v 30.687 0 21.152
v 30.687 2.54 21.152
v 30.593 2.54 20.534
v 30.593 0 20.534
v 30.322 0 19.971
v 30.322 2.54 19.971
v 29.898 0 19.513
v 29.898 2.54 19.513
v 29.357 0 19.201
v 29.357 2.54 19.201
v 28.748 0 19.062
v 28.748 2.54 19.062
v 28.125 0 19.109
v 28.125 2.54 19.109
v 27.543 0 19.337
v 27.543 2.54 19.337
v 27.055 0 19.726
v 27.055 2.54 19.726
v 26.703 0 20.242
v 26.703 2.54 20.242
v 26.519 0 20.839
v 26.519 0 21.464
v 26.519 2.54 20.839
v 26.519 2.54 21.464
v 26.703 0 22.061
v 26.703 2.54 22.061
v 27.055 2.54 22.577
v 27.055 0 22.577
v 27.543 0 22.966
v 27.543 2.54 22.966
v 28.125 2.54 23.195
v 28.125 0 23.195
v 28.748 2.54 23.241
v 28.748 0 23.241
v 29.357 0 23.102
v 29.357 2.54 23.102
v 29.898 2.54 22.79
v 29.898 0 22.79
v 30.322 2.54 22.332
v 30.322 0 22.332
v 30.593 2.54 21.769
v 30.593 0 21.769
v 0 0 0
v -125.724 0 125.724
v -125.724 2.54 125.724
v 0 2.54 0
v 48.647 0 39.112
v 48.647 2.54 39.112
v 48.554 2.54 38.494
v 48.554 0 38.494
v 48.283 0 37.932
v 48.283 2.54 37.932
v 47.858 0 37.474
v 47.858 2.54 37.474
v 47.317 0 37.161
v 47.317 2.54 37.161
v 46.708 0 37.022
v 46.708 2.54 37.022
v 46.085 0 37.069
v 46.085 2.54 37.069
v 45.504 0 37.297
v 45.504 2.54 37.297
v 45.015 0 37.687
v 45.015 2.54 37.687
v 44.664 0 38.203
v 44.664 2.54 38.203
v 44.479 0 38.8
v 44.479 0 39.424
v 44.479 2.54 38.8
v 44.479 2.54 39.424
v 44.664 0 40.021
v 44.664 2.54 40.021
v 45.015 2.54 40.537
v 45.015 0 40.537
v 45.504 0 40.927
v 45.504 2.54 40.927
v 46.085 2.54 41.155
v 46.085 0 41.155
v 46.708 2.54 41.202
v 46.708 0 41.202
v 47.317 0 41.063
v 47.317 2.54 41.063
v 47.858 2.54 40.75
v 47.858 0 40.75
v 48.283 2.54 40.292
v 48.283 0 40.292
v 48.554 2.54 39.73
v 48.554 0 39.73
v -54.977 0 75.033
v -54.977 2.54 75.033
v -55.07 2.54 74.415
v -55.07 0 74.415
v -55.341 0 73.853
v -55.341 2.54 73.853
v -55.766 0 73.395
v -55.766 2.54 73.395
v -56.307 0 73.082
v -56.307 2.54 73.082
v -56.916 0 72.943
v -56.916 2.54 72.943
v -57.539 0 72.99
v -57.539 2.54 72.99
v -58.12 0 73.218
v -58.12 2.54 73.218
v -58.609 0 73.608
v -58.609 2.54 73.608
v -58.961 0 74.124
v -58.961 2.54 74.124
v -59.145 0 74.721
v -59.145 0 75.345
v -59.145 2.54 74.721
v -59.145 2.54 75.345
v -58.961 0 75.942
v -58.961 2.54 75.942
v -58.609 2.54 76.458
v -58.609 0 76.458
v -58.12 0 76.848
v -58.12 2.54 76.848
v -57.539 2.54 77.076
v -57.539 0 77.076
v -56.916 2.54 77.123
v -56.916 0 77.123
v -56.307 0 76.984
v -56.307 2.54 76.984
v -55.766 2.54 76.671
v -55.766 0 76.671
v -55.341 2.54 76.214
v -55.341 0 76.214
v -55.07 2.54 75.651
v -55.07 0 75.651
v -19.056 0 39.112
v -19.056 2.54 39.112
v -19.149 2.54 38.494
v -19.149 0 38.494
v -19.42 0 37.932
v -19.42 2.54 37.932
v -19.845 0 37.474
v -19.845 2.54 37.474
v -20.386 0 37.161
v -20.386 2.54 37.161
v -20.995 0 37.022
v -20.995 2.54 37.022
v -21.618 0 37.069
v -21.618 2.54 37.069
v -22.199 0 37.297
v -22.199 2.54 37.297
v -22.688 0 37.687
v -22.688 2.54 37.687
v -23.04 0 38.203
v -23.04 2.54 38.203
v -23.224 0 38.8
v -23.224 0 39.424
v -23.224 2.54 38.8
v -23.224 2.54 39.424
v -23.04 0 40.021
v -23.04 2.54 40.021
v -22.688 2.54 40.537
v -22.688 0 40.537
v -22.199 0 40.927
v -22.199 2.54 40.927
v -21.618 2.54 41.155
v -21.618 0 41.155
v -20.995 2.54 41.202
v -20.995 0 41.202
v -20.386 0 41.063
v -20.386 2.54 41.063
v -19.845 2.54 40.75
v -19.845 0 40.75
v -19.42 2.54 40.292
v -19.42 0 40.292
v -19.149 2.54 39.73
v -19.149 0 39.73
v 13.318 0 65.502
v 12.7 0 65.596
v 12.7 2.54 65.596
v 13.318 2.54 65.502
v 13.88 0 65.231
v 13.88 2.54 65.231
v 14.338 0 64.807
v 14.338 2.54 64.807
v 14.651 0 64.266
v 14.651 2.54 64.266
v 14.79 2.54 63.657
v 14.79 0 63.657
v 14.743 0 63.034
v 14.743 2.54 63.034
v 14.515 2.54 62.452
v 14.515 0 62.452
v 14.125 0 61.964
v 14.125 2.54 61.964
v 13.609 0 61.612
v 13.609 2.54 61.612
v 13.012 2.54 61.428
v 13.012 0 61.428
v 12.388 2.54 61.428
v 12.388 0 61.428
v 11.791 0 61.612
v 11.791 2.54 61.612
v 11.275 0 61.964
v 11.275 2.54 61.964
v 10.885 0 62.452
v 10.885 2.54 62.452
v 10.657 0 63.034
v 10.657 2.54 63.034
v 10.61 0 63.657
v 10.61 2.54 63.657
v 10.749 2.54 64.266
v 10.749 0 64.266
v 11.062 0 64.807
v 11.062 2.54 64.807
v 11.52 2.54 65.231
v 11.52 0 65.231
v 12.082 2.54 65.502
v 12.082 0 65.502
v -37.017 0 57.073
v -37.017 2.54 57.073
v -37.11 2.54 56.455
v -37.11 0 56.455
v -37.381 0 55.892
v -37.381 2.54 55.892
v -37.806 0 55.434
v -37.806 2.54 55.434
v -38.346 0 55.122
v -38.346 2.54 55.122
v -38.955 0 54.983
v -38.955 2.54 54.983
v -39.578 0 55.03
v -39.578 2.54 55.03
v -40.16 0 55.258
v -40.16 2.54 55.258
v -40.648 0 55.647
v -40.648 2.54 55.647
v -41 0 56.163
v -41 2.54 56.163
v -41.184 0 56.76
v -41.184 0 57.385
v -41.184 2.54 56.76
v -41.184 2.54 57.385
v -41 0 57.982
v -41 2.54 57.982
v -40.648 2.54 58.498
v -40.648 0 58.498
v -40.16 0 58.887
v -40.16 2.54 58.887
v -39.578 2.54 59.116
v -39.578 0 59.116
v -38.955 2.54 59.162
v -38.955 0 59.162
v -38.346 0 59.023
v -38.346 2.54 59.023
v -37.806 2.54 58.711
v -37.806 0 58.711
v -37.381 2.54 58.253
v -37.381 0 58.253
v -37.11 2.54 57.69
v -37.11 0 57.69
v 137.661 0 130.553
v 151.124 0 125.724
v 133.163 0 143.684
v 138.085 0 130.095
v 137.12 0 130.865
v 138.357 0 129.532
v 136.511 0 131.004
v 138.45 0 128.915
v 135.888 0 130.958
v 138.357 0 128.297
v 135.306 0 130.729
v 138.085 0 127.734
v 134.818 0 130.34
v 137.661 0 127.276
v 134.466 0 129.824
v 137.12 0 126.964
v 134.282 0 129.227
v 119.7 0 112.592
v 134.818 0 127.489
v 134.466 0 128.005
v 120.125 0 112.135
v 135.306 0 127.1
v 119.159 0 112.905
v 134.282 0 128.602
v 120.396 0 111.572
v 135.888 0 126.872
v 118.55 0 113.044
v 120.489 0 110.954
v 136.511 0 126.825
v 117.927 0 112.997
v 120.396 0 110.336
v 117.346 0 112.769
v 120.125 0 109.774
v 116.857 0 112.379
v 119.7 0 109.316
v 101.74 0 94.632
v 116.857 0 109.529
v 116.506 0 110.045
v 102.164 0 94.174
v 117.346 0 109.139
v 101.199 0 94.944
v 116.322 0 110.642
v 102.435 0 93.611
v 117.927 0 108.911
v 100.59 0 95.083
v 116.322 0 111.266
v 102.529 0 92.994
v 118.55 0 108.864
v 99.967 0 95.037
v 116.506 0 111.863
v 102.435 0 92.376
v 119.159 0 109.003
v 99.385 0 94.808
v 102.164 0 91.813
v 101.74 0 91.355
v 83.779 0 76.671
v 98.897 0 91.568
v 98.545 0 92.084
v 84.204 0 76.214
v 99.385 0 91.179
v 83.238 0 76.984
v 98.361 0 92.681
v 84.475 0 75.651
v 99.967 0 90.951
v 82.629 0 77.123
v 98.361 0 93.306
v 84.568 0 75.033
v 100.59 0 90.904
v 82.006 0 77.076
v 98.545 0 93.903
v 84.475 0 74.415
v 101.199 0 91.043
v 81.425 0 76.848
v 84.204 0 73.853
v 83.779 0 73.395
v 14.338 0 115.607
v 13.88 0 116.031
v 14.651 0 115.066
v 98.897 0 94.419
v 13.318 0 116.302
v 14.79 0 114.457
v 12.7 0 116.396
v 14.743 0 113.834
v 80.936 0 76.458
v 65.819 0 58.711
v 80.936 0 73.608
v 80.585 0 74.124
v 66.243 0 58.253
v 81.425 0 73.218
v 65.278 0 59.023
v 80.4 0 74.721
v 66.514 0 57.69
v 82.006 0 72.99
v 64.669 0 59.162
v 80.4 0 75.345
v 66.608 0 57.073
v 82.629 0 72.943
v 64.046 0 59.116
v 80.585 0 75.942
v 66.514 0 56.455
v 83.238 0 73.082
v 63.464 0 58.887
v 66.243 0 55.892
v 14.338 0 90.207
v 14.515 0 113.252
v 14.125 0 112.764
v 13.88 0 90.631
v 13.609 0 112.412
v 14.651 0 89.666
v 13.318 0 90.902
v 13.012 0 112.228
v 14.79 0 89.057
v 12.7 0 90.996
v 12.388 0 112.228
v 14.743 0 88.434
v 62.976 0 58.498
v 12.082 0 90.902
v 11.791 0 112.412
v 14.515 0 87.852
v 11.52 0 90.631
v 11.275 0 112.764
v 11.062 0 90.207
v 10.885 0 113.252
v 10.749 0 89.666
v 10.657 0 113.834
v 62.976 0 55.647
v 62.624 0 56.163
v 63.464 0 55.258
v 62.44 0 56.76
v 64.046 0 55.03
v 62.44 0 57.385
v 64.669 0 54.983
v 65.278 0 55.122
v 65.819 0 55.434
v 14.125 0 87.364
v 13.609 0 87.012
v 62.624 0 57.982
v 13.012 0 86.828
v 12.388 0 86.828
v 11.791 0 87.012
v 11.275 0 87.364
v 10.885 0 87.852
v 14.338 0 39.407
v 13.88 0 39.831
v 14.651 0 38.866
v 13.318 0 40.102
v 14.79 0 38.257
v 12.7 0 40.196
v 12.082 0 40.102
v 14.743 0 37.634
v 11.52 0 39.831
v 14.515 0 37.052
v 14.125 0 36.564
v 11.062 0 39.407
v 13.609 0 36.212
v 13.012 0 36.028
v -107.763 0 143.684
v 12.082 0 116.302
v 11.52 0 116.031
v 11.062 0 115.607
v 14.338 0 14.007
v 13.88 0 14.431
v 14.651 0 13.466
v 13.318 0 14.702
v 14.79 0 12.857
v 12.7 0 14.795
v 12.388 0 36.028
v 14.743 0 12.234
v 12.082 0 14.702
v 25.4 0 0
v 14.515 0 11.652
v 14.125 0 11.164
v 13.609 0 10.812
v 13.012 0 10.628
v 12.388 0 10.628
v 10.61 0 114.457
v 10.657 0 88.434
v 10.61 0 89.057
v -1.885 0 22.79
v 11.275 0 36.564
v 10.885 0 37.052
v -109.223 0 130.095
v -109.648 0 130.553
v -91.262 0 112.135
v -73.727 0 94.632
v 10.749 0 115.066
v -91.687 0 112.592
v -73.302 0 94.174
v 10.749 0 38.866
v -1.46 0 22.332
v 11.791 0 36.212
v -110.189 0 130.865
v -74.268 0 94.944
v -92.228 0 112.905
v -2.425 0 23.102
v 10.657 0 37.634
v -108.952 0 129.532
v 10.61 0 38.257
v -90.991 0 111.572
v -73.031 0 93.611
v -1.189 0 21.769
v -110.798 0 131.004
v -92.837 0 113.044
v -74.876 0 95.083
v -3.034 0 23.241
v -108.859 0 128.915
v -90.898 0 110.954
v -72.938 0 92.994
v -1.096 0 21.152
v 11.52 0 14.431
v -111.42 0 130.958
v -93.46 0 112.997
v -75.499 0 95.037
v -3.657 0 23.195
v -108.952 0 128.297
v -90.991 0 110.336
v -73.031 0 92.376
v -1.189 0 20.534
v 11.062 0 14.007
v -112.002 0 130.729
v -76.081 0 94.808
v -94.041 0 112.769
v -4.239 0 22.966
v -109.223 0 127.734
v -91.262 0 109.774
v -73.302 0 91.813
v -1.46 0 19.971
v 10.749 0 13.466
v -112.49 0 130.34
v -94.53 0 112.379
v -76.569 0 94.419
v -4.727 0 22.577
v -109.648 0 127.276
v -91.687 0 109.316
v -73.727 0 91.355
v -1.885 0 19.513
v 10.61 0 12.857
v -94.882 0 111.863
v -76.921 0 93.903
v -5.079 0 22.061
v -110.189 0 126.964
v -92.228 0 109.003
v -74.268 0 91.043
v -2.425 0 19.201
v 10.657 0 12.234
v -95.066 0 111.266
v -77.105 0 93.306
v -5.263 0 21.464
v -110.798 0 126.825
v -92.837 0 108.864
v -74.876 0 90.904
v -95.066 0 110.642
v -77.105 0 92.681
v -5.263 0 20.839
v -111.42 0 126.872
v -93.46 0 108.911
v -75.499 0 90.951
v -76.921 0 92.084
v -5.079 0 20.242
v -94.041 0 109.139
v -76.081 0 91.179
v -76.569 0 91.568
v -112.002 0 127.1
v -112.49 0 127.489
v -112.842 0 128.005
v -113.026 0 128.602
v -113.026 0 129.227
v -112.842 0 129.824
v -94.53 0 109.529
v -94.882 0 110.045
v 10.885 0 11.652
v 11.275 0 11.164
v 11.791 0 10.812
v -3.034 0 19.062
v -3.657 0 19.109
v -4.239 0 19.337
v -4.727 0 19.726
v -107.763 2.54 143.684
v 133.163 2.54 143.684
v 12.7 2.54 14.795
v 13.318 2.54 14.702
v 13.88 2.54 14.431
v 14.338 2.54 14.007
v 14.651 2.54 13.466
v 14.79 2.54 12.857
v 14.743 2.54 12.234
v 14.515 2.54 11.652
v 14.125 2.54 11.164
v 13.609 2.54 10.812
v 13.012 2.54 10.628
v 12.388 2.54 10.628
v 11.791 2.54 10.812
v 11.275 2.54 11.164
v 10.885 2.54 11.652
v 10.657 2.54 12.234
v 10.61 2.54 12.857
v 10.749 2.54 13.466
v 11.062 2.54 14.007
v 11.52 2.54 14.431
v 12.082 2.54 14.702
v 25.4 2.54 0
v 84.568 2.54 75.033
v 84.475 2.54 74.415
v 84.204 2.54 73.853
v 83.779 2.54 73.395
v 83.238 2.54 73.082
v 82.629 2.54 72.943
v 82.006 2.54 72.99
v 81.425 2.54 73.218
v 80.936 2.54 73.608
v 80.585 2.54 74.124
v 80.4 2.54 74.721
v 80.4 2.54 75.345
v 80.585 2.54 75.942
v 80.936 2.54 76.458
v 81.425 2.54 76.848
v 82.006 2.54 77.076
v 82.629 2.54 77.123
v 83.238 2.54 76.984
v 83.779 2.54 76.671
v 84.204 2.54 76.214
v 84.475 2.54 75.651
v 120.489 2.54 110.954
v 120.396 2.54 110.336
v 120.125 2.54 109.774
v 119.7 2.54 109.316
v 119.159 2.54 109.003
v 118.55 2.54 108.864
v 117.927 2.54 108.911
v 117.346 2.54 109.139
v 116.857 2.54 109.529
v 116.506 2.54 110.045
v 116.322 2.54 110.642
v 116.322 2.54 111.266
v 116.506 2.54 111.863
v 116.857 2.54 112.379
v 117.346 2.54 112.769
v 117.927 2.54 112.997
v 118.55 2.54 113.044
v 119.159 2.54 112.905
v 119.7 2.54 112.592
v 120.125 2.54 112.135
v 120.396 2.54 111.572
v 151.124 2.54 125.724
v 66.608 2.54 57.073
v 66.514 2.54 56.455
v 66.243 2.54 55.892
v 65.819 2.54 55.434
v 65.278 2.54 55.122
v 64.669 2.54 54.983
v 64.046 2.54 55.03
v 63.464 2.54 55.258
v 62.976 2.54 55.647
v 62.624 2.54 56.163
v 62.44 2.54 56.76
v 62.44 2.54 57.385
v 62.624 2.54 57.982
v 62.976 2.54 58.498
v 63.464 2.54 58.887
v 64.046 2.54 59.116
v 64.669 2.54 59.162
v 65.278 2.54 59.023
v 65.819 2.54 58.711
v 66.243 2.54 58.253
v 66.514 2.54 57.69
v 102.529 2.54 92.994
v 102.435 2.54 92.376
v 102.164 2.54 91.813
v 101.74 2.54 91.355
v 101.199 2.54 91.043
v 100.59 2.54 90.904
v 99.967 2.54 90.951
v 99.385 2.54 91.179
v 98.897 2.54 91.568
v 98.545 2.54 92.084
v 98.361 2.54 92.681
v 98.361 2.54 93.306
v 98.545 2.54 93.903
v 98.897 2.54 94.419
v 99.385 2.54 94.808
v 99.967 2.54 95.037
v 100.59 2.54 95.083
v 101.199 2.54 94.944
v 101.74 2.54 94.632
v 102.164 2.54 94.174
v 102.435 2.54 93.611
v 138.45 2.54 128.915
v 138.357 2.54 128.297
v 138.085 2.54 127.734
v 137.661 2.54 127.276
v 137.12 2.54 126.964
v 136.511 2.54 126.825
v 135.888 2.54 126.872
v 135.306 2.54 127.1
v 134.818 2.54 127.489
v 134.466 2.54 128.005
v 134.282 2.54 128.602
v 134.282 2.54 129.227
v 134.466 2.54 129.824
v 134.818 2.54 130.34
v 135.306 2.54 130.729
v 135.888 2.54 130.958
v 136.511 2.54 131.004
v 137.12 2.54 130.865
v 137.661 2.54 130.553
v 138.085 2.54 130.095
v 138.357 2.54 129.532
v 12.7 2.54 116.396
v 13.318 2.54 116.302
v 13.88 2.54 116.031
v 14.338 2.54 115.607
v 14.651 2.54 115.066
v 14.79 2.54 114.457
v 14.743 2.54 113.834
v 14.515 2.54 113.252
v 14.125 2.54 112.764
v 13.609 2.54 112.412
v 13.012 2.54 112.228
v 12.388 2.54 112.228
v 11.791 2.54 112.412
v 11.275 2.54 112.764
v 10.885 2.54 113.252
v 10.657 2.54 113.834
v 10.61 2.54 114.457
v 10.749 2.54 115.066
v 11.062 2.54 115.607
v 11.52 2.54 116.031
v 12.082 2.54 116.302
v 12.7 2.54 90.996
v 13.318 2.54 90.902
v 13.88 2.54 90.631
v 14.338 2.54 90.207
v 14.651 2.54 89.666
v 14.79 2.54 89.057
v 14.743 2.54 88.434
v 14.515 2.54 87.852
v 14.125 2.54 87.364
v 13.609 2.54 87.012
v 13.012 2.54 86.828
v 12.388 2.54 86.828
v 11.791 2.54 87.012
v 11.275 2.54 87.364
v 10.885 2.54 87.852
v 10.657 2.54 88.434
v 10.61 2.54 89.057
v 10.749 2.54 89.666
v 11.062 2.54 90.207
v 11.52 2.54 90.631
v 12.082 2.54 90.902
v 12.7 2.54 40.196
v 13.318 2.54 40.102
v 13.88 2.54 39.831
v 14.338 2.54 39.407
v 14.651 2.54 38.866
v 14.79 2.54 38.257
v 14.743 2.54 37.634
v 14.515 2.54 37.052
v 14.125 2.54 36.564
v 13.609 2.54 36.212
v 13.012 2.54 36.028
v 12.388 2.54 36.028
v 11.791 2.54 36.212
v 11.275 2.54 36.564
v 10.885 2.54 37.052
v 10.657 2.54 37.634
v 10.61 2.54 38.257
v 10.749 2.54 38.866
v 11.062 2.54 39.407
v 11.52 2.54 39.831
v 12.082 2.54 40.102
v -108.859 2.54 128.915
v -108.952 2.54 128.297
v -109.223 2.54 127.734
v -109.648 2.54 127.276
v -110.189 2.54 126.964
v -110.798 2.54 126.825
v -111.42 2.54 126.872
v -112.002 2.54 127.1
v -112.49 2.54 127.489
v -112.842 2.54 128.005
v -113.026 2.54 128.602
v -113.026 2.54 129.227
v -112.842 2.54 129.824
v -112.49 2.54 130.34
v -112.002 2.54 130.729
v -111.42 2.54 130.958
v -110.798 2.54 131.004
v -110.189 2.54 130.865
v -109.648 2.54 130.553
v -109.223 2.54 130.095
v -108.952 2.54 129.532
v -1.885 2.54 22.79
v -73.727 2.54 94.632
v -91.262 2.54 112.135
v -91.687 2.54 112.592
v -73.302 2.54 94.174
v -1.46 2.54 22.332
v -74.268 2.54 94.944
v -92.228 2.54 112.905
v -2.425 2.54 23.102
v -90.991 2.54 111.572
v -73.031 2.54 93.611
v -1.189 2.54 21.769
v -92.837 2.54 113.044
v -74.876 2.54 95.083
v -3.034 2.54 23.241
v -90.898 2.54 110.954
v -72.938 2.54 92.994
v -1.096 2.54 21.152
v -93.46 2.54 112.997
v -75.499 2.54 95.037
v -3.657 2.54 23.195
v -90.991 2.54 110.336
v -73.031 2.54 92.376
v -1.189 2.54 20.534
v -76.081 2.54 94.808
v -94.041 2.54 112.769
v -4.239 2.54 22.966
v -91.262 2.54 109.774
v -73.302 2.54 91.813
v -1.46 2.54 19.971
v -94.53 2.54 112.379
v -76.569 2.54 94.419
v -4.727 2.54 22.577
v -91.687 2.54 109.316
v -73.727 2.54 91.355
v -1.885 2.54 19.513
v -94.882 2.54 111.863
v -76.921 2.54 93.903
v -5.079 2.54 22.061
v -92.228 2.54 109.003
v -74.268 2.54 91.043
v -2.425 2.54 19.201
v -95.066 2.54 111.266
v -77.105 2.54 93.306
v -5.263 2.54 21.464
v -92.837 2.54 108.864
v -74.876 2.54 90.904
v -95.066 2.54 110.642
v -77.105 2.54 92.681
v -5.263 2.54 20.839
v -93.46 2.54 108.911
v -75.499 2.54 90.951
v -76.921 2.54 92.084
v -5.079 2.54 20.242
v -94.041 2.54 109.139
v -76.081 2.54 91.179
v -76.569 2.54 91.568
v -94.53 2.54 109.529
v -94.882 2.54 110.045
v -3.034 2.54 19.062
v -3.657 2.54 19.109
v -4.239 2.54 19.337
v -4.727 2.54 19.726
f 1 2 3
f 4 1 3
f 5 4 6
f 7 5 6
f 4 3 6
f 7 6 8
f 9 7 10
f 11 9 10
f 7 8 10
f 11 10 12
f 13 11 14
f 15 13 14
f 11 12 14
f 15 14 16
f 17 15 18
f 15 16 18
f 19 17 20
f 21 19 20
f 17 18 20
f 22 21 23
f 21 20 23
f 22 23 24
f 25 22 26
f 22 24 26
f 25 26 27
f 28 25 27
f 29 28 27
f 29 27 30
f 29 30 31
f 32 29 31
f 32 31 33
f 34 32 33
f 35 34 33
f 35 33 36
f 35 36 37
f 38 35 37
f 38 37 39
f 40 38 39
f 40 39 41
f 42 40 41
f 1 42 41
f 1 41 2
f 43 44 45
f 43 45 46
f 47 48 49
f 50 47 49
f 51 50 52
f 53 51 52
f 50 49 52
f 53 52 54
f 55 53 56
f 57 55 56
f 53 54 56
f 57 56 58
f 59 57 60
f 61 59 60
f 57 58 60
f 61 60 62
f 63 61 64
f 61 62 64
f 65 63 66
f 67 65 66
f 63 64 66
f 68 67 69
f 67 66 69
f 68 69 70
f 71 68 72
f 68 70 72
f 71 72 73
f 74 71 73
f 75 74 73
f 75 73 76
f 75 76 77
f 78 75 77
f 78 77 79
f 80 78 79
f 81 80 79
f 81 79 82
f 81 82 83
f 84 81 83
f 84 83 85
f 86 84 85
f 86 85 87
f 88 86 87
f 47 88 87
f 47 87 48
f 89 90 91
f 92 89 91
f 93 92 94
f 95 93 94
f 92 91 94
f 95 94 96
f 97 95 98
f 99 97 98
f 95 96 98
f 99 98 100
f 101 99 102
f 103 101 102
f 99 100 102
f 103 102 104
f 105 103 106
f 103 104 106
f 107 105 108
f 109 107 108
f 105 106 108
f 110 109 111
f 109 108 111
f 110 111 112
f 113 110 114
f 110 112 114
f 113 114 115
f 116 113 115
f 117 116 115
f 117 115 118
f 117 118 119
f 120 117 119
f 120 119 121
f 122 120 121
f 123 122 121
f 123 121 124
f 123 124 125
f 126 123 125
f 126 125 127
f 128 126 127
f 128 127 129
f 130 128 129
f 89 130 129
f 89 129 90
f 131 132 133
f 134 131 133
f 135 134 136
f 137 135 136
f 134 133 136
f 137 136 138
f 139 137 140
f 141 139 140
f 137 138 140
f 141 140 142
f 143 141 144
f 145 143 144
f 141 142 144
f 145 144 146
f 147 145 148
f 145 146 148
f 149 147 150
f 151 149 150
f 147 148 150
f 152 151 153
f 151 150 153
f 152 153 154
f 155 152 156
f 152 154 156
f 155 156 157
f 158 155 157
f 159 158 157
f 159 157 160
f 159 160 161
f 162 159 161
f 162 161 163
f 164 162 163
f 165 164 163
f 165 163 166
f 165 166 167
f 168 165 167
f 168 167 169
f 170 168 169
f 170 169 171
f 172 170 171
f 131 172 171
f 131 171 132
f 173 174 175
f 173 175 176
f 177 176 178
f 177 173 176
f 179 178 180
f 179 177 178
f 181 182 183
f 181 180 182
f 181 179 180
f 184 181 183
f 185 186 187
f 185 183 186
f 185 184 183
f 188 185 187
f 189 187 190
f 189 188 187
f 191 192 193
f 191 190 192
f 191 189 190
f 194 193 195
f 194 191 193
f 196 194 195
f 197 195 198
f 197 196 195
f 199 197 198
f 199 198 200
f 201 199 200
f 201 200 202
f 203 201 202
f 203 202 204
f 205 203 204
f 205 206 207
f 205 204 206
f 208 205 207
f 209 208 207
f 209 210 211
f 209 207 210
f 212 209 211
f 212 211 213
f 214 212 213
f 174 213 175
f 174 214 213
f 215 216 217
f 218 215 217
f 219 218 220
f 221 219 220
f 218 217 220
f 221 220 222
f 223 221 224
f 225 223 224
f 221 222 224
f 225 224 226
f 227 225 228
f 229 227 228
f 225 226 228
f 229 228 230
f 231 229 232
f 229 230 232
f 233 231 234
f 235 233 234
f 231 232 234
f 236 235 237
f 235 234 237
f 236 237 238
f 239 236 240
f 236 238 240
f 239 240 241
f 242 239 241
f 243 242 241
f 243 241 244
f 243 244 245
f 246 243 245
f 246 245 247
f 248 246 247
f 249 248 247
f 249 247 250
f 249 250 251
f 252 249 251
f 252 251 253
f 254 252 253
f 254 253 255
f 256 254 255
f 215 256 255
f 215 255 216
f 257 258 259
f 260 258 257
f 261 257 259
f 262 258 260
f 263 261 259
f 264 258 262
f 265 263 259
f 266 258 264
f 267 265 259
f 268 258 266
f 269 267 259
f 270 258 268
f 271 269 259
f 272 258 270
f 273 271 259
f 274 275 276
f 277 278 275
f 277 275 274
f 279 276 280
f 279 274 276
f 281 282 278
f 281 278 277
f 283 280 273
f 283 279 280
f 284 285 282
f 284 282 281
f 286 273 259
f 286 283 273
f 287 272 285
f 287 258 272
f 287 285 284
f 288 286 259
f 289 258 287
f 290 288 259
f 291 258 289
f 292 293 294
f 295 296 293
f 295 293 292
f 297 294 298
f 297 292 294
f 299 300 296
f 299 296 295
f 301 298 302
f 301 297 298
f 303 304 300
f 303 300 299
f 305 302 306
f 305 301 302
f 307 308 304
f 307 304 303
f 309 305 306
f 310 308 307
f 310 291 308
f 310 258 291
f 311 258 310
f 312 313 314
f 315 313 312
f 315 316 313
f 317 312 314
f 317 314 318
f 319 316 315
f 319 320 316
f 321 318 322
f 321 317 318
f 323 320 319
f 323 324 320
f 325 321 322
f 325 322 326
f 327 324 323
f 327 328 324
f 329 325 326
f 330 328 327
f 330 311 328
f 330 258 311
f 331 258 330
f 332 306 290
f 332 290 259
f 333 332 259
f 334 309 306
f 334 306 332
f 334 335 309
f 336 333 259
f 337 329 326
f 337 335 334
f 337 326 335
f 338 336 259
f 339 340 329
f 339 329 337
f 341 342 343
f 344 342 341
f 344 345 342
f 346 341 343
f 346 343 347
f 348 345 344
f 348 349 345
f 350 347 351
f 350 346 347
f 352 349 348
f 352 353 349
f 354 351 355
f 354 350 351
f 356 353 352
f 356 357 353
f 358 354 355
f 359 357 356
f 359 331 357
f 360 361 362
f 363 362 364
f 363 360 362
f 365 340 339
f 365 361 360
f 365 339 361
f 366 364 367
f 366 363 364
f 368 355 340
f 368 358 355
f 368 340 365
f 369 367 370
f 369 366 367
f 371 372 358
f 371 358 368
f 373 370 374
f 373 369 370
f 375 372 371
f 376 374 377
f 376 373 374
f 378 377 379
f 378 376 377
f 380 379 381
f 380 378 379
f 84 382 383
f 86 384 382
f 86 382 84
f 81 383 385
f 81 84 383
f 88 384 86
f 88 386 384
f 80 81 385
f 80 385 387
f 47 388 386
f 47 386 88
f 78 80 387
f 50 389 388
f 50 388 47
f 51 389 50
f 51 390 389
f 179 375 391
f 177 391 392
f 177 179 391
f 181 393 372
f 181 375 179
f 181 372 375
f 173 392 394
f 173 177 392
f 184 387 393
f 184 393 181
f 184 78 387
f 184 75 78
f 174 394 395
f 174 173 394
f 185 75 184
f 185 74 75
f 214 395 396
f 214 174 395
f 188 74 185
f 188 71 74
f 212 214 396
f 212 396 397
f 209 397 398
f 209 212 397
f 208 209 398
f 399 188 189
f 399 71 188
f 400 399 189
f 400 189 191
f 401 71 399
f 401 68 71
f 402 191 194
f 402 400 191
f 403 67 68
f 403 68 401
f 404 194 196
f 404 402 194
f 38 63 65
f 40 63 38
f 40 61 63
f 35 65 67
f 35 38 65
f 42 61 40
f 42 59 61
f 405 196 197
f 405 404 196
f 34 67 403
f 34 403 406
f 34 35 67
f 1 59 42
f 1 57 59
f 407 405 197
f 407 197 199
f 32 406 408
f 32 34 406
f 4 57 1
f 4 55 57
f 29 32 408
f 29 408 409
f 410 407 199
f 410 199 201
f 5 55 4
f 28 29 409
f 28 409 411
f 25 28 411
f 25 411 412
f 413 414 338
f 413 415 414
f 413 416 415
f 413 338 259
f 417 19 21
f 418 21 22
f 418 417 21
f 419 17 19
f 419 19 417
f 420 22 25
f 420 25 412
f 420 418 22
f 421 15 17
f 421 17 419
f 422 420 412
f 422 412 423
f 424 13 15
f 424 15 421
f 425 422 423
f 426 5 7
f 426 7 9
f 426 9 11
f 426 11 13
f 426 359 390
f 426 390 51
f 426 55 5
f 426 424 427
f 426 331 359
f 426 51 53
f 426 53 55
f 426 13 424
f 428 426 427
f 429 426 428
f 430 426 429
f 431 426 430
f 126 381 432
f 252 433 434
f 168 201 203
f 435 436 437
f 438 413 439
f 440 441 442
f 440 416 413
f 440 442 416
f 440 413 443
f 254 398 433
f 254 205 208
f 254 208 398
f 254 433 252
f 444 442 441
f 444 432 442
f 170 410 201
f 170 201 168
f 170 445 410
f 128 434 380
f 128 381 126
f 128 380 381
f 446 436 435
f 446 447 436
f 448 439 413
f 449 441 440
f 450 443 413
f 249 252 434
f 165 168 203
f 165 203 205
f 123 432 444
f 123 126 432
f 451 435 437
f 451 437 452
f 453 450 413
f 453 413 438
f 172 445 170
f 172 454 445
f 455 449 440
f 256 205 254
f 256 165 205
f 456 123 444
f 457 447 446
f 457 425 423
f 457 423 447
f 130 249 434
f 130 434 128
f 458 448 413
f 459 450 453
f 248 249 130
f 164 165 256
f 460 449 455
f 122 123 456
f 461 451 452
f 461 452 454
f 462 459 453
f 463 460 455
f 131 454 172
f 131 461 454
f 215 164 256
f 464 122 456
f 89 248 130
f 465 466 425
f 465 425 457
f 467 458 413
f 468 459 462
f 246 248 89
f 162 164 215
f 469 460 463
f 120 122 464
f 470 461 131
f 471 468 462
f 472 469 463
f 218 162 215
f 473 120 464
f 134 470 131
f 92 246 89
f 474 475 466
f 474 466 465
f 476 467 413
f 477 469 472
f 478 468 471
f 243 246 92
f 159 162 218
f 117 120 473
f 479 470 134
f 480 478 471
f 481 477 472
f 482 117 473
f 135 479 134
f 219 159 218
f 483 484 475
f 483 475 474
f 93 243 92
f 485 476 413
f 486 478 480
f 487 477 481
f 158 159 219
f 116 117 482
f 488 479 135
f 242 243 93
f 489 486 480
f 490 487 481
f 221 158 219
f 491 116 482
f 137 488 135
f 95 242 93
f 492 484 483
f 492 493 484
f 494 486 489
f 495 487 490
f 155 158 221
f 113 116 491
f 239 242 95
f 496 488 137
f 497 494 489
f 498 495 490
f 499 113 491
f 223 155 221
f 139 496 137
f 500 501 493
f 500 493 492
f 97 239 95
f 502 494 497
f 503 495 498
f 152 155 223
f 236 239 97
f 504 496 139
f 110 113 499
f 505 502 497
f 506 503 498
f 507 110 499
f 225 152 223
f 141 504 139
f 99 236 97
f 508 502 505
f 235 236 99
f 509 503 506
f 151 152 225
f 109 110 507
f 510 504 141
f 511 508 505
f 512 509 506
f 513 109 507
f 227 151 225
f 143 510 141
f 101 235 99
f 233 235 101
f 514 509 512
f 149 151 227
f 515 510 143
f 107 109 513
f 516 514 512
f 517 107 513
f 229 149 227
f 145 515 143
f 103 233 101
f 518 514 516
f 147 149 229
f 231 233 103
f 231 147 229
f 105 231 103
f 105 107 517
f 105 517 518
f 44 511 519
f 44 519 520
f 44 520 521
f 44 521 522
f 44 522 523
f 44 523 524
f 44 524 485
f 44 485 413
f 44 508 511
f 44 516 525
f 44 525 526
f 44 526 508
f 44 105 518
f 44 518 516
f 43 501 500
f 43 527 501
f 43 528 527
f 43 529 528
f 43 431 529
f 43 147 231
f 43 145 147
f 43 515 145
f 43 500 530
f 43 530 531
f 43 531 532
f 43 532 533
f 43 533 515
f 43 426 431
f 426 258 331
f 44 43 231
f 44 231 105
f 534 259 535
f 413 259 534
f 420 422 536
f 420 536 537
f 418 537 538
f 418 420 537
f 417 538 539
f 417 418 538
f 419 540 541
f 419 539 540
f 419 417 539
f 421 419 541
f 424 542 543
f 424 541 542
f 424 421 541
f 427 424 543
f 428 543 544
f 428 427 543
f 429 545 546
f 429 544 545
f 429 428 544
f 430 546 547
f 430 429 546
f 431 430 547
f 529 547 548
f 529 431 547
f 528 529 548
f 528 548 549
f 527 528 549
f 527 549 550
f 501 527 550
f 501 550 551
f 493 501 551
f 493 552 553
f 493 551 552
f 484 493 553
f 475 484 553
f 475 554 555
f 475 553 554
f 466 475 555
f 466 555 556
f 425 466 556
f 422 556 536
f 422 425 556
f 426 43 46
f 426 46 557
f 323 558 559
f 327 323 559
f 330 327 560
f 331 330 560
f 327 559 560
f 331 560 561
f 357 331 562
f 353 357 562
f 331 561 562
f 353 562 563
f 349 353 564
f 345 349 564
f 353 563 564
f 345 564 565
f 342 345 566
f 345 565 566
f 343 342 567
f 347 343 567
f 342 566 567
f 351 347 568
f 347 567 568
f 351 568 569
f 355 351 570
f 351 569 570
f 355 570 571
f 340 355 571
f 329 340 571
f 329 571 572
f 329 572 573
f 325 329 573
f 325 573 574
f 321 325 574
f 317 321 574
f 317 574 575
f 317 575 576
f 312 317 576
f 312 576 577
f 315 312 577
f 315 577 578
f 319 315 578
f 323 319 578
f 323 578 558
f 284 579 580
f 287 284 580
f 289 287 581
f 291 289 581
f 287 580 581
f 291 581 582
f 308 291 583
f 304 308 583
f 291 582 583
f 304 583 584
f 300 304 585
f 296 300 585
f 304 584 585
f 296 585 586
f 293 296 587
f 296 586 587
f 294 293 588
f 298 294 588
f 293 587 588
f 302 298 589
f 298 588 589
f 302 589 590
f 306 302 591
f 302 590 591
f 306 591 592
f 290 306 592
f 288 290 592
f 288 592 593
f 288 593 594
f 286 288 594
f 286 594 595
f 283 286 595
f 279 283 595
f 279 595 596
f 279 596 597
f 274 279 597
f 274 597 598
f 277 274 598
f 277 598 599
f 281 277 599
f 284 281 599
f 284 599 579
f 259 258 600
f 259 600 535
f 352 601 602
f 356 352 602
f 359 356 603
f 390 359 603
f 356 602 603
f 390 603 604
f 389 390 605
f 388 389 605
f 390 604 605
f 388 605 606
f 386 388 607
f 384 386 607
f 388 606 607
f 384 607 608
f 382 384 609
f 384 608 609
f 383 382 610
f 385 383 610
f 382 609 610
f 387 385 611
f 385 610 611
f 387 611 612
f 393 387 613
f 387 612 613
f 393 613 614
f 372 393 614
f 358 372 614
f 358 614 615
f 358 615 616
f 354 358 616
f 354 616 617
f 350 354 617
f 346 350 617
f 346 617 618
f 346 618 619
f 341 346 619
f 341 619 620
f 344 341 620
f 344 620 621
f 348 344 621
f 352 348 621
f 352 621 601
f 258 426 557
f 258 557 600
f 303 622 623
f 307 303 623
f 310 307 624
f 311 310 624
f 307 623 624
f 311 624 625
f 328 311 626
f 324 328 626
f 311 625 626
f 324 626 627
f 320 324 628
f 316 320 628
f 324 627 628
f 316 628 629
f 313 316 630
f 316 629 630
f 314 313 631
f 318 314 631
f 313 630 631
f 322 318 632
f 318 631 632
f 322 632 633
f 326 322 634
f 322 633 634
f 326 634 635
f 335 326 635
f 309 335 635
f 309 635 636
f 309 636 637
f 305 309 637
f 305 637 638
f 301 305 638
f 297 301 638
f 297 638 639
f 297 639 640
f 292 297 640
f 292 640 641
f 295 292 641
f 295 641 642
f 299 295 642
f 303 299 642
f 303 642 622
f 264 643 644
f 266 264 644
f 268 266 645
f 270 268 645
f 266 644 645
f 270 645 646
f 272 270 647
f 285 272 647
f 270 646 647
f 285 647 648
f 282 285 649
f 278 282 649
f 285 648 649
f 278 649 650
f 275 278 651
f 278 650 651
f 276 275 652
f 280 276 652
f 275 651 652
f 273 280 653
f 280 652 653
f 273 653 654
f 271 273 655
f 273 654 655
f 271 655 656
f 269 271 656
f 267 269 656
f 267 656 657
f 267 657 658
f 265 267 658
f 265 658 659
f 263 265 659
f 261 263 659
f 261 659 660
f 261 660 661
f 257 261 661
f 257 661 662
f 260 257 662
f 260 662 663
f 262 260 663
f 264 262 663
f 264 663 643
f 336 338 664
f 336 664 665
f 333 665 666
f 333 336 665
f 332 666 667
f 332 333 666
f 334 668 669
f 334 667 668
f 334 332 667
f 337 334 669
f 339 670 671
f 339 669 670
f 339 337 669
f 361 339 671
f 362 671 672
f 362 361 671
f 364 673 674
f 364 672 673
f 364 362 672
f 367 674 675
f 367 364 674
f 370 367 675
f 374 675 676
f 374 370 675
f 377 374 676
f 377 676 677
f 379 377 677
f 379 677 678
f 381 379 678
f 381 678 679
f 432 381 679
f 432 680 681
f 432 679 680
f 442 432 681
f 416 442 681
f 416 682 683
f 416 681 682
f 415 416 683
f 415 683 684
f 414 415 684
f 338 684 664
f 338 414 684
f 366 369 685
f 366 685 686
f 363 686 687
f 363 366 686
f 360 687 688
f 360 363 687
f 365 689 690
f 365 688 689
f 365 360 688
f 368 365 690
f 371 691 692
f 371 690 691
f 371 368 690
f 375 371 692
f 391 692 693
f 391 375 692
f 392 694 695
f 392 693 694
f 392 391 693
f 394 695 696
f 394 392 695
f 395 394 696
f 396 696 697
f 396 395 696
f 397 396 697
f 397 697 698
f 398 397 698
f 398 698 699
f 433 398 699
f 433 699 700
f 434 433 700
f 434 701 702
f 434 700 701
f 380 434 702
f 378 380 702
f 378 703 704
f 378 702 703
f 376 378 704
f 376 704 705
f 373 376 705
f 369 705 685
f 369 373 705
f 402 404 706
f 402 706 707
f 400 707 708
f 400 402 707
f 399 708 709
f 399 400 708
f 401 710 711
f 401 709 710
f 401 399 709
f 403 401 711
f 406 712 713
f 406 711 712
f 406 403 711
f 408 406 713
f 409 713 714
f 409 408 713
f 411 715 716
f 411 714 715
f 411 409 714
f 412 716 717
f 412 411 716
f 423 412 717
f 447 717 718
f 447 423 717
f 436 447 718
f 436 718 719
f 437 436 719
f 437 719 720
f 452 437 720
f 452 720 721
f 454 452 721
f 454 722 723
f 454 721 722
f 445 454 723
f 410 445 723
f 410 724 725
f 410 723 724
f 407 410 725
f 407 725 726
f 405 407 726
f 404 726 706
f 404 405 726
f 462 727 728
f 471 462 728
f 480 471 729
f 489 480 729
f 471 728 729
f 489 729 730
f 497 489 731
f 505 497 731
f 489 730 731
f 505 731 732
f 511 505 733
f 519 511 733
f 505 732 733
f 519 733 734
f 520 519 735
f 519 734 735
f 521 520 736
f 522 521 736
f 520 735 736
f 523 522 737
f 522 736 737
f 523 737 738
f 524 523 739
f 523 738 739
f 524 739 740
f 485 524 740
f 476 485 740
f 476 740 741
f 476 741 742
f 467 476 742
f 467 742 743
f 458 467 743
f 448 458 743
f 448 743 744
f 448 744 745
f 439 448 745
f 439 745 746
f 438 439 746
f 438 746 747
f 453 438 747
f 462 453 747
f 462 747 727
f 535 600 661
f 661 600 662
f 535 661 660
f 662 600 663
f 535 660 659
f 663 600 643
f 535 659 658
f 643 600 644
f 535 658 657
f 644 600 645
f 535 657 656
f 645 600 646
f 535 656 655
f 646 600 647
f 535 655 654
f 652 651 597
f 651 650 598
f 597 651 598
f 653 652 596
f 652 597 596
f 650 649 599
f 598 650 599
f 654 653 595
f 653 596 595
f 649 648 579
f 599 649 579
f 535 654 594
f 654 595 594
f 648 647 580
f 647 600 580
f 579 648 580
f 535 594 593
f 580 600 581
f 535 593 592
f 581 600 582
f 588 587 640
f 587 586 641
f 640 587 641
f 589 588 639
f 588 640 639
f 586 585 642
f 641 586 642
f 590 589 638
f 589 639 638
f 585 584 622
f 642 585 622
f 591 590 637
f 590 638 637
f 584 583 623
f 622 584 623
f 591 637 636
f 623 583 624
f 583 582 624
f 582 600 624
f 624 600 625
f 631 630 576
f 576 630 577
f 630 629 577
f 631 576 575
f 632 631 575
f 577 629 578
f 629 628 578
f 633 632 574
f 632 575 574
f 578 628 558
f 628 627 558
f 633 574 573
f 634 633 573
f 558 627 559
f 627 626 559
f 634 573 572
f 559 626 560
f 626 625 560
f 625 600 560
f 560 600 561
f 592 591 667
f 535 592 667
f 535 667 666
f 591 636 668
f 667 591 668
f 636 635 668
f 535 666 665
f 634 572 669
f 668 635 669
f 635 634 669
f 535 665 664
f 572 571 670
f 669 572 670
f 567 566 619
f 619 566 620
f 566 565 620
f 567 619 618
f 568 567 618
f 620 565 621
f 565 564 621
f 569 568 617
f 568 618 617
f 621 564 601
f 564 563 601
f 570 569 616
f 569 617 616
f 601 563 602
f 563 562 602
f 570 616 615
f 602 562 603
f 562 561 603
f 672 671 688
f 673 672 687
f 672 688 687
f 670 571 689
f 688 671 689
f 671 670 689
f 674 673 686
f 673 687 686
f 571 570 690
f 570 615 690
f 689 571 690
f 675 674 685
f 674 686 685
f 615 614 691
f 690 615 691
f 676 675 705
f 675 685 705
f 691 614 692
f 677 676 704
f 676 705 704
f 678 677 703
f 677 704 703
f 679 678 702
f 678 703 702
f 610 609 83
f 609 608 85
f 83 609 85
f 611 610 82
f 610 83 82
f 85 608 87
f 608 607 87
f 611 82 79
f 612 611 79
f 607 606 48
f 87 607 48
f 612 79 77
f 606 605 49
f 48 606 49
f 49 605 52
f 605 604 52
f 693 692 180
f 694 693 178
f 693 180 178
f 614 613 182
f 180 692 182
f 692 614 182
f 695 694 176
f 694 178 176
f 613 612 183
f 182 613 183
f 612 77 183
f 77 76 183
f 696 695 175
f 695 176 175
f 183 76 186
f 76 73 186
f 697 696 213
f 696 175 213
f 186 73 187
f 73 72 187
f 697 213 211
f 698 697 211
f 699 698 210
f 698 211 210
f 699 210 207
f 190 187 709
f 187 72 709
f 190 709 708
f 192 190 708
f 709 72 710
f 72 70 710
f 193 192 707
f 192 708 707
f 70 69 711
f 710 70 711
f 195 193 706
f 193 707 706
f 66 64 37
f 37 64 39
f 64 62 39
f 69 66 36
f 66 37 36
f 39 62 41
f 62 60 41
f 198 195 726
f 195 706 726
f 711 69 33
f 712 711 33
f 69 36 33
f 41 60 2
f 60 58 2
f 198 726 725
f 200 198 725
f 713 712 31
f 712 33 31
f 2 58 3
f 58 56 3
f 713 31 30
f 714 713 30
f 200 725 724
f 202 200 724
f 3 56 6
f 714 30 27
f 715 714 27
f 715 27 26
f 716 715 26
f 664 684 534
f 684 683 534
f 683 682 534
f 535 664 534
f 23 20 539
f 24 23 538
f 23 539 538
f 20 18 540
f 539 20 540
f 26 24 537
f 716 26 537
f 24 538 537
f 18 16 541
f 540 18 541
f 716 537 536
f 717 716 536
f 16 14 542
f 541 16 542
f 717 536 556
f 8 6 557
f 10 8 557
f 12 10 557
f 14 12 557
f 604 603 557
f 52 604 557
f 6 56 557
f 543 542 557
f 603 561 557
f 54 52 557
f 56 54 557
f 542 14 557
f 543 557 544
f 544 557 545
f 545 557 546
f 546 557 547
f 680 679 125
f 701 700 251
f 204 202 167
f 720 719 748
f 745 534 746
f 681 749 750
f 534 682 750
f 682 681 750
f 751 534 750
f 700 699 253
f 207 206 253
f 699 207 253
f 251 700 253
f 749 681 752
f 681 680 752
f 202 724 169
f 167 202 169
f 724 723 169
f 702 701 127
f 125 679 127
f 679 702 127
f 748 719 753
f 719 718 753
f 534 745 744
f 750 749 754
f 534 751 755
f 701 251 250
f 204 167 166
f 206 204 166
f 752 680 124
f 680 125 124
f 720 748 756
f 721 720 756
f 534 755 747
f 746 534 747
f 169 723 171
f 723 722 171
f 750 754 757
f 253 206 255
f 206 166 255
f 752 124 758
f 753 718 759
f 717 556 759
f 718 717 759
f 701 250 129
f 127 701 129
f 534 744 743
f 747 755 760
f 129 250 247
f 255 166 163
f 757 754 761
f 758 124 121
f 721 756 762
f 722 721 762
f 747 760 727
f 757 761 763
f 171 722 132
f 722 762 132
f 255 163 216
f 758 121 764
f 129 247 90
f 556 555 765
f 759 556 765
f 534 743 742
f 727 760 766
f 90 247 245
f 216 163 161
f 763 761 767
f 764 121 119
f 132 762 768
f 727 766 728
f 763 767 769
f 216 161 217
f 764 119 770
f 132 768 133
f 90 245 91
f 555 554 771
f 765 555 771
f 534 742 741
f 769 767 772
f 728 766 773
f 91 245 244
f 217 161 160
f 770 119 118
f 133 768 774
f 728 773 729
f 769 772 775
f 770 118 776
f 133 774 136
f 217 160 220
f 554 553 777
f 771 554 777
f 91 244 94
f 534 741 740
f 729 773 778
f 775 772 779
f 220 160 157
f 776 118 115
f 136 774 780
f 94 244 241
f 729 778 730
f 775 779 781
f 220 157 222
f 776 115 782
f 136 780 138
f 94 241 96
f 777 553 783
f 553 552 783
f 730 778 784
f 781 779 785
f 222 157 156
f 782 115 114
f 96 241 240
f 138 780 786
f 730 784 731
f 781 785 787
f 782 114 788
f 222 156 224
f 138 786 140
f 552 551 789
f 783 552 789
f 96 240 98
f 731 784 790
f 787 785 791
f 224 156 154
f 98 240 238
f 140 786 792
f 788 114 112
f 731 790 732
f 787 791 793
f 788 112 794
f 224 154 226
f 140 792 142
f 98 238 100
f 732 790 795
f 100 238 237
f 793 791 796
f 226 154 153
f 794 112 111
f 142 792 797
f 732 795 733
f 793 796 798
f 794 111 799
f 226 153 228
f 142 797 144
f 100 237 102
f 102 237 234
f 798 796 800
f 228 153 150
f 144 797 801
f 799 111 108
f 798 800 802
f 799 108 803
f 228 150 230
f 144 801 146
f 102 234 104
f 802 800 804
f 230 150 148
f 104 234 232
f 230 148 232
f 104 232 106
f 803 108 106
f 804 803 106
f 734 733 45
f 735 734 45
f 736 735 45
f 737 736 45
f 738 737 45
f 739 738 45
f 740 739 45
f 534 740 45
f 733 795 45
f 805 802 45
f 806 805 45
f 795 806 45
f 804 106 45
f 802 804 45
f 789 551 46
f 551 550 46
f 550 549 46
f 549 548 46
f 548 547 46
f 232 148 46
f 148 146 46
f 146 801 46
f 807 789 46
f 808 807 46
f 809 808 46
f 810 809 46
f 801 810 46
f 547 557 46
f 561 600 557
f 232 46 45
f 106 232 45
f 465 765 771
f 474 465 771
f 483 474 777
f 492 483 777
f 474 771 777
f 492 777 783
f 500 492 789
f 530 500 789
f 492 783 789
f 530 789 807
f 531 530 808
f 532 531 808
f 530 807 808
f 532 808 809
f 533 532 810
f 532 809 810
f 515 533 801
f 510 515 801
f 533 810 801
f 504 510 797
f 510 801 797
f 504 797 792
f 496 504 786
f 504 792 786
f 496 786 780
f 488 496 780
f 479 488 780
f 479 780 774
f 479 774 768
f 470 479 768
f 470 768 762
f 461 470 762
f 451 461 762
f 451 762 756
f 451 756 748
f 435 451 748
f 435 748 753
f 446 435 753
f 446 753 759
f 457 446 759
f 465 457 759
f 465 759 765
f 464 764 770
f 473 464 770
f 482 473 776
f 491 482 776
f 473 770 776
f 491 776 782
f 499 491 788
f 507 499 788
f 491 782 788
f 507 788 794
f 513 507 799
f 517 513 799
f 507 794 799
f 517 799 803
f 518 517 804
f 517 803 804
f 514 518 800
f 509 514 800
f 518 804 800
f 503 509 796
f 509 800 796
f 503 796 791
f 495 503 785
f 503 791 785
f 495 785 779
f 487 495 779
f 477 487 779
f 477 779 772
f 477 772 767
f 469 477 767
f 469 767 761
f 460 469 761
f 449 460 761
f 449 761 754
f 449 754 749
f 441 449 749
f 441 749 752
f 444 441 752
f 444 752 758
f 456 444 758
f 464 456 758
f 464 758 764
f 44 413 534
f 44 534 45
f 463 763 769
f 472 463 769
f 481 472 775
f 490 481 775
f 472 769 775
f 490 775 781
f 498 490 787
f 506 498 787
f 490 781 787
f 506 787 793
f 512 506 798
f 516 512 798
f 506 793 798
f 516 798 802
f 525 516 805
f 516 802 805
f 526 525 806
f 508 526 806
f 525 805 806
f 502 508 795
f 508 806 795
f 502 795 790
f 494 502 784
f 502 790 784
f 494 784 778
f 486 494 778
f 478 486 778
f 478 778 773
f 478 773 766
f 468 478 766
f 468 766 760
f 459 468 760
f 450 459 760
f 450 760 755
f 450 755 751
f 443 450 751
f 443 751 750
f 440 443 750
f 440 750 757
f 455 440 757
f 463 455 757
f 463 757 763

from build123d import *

# Parameters (mm, degrees)
BOSS_EXTRUDE1_DEPTH        = 2.54
CUT_EXTRUDE1_DEPTH         = 209.542345228
CUT_EXTRUDE1_DEPTH_BACK    = 209.542345228
SKETCH2_R                  = 2.0955
F_8_0_199_DIAMETER_HOLE1_D = 4.191


with BuildPart() as part:
    # Sketch1 → Boss-Extrude1 (new body)
    with BuildSketch(Plane(origin=(0, 0, 0), x_dir=(1, 0, 0), z_dir=(0, 1, 0))):
        Polygon((0, 0), (25.4, 0), (151.123585695, -125.723585695), (133.163073453, -143.684097937), (-107.763073453, -143.684097937), (-125.723585695, -125.723585695), align=None)
    extrude(amount=BOSS_EXTRUDE1_DEPTH)

    # Sketch2 → Cut-Extrude1 (cut, two sides: drawn at the far end of the back side and taken through both)
    with BuildSketch(Plane(origin=(0, 2.54, 0), x_dir=(1, 0, 0), z_dir=(0, 1, 0)).offset(-CUT_EXTRUDE1_DEPTH_BACK)):
        with Locations(Location((12.7, -12.7, 0), (0, 0, 270))):
            Circle(SKETCH2_R)
        with Locations(Location((12.7, -38.1, 0), (0, 0, 270))):
            Circle(SKETCH2_R)
        with Locations(Location((12.7, -63.5, 0), (0, 0, 270))):
            Circle(SKETCH2_R)
        with Locations(Location((12.7, -88.9, 0), (0, 0, 270))):
            Circle(SKETCH2_R)
        with Locations(Location((12.7, -114.3, 0), (0, 0, 270))):
            Circle(SKETCH2_R)
    extrude(amount=CUT_EXTRUDE1_DEPTH + CUT_EXTRUDE1_DEPTH_BACK, mode=Mode.SUBTRACT)

    # #8 (0.199) Diameter Hole1 (through all)
    with Locations(Plane(origin=(0, 0, 0), x_dir=(-1, 0, 0), z_dir=(0, -1, 0))):
        with Locations((21.151548005, -39.112060247), (39.112060247, -57.072572489), (57.072572489, -75.033084731), (75.033084731, -92.993596973), (92.993596973, -110.954109215), (110.954109215, -128.914621458), (-28.591035763, -21.151548005), (-46.551548005, -39.112060247), (-64.512060247, -57.072572489), (-82.472572489, -75.033084731), (-100.433084731, -92.993596973), (-118.393596973, -110.954109215), (-136.354109215, -128.914621458), (3.191035763, -21.151548005)):
            Hole(F_8_0_199_DIAMETER_HOLE1_D / 2)


solid = part.part
